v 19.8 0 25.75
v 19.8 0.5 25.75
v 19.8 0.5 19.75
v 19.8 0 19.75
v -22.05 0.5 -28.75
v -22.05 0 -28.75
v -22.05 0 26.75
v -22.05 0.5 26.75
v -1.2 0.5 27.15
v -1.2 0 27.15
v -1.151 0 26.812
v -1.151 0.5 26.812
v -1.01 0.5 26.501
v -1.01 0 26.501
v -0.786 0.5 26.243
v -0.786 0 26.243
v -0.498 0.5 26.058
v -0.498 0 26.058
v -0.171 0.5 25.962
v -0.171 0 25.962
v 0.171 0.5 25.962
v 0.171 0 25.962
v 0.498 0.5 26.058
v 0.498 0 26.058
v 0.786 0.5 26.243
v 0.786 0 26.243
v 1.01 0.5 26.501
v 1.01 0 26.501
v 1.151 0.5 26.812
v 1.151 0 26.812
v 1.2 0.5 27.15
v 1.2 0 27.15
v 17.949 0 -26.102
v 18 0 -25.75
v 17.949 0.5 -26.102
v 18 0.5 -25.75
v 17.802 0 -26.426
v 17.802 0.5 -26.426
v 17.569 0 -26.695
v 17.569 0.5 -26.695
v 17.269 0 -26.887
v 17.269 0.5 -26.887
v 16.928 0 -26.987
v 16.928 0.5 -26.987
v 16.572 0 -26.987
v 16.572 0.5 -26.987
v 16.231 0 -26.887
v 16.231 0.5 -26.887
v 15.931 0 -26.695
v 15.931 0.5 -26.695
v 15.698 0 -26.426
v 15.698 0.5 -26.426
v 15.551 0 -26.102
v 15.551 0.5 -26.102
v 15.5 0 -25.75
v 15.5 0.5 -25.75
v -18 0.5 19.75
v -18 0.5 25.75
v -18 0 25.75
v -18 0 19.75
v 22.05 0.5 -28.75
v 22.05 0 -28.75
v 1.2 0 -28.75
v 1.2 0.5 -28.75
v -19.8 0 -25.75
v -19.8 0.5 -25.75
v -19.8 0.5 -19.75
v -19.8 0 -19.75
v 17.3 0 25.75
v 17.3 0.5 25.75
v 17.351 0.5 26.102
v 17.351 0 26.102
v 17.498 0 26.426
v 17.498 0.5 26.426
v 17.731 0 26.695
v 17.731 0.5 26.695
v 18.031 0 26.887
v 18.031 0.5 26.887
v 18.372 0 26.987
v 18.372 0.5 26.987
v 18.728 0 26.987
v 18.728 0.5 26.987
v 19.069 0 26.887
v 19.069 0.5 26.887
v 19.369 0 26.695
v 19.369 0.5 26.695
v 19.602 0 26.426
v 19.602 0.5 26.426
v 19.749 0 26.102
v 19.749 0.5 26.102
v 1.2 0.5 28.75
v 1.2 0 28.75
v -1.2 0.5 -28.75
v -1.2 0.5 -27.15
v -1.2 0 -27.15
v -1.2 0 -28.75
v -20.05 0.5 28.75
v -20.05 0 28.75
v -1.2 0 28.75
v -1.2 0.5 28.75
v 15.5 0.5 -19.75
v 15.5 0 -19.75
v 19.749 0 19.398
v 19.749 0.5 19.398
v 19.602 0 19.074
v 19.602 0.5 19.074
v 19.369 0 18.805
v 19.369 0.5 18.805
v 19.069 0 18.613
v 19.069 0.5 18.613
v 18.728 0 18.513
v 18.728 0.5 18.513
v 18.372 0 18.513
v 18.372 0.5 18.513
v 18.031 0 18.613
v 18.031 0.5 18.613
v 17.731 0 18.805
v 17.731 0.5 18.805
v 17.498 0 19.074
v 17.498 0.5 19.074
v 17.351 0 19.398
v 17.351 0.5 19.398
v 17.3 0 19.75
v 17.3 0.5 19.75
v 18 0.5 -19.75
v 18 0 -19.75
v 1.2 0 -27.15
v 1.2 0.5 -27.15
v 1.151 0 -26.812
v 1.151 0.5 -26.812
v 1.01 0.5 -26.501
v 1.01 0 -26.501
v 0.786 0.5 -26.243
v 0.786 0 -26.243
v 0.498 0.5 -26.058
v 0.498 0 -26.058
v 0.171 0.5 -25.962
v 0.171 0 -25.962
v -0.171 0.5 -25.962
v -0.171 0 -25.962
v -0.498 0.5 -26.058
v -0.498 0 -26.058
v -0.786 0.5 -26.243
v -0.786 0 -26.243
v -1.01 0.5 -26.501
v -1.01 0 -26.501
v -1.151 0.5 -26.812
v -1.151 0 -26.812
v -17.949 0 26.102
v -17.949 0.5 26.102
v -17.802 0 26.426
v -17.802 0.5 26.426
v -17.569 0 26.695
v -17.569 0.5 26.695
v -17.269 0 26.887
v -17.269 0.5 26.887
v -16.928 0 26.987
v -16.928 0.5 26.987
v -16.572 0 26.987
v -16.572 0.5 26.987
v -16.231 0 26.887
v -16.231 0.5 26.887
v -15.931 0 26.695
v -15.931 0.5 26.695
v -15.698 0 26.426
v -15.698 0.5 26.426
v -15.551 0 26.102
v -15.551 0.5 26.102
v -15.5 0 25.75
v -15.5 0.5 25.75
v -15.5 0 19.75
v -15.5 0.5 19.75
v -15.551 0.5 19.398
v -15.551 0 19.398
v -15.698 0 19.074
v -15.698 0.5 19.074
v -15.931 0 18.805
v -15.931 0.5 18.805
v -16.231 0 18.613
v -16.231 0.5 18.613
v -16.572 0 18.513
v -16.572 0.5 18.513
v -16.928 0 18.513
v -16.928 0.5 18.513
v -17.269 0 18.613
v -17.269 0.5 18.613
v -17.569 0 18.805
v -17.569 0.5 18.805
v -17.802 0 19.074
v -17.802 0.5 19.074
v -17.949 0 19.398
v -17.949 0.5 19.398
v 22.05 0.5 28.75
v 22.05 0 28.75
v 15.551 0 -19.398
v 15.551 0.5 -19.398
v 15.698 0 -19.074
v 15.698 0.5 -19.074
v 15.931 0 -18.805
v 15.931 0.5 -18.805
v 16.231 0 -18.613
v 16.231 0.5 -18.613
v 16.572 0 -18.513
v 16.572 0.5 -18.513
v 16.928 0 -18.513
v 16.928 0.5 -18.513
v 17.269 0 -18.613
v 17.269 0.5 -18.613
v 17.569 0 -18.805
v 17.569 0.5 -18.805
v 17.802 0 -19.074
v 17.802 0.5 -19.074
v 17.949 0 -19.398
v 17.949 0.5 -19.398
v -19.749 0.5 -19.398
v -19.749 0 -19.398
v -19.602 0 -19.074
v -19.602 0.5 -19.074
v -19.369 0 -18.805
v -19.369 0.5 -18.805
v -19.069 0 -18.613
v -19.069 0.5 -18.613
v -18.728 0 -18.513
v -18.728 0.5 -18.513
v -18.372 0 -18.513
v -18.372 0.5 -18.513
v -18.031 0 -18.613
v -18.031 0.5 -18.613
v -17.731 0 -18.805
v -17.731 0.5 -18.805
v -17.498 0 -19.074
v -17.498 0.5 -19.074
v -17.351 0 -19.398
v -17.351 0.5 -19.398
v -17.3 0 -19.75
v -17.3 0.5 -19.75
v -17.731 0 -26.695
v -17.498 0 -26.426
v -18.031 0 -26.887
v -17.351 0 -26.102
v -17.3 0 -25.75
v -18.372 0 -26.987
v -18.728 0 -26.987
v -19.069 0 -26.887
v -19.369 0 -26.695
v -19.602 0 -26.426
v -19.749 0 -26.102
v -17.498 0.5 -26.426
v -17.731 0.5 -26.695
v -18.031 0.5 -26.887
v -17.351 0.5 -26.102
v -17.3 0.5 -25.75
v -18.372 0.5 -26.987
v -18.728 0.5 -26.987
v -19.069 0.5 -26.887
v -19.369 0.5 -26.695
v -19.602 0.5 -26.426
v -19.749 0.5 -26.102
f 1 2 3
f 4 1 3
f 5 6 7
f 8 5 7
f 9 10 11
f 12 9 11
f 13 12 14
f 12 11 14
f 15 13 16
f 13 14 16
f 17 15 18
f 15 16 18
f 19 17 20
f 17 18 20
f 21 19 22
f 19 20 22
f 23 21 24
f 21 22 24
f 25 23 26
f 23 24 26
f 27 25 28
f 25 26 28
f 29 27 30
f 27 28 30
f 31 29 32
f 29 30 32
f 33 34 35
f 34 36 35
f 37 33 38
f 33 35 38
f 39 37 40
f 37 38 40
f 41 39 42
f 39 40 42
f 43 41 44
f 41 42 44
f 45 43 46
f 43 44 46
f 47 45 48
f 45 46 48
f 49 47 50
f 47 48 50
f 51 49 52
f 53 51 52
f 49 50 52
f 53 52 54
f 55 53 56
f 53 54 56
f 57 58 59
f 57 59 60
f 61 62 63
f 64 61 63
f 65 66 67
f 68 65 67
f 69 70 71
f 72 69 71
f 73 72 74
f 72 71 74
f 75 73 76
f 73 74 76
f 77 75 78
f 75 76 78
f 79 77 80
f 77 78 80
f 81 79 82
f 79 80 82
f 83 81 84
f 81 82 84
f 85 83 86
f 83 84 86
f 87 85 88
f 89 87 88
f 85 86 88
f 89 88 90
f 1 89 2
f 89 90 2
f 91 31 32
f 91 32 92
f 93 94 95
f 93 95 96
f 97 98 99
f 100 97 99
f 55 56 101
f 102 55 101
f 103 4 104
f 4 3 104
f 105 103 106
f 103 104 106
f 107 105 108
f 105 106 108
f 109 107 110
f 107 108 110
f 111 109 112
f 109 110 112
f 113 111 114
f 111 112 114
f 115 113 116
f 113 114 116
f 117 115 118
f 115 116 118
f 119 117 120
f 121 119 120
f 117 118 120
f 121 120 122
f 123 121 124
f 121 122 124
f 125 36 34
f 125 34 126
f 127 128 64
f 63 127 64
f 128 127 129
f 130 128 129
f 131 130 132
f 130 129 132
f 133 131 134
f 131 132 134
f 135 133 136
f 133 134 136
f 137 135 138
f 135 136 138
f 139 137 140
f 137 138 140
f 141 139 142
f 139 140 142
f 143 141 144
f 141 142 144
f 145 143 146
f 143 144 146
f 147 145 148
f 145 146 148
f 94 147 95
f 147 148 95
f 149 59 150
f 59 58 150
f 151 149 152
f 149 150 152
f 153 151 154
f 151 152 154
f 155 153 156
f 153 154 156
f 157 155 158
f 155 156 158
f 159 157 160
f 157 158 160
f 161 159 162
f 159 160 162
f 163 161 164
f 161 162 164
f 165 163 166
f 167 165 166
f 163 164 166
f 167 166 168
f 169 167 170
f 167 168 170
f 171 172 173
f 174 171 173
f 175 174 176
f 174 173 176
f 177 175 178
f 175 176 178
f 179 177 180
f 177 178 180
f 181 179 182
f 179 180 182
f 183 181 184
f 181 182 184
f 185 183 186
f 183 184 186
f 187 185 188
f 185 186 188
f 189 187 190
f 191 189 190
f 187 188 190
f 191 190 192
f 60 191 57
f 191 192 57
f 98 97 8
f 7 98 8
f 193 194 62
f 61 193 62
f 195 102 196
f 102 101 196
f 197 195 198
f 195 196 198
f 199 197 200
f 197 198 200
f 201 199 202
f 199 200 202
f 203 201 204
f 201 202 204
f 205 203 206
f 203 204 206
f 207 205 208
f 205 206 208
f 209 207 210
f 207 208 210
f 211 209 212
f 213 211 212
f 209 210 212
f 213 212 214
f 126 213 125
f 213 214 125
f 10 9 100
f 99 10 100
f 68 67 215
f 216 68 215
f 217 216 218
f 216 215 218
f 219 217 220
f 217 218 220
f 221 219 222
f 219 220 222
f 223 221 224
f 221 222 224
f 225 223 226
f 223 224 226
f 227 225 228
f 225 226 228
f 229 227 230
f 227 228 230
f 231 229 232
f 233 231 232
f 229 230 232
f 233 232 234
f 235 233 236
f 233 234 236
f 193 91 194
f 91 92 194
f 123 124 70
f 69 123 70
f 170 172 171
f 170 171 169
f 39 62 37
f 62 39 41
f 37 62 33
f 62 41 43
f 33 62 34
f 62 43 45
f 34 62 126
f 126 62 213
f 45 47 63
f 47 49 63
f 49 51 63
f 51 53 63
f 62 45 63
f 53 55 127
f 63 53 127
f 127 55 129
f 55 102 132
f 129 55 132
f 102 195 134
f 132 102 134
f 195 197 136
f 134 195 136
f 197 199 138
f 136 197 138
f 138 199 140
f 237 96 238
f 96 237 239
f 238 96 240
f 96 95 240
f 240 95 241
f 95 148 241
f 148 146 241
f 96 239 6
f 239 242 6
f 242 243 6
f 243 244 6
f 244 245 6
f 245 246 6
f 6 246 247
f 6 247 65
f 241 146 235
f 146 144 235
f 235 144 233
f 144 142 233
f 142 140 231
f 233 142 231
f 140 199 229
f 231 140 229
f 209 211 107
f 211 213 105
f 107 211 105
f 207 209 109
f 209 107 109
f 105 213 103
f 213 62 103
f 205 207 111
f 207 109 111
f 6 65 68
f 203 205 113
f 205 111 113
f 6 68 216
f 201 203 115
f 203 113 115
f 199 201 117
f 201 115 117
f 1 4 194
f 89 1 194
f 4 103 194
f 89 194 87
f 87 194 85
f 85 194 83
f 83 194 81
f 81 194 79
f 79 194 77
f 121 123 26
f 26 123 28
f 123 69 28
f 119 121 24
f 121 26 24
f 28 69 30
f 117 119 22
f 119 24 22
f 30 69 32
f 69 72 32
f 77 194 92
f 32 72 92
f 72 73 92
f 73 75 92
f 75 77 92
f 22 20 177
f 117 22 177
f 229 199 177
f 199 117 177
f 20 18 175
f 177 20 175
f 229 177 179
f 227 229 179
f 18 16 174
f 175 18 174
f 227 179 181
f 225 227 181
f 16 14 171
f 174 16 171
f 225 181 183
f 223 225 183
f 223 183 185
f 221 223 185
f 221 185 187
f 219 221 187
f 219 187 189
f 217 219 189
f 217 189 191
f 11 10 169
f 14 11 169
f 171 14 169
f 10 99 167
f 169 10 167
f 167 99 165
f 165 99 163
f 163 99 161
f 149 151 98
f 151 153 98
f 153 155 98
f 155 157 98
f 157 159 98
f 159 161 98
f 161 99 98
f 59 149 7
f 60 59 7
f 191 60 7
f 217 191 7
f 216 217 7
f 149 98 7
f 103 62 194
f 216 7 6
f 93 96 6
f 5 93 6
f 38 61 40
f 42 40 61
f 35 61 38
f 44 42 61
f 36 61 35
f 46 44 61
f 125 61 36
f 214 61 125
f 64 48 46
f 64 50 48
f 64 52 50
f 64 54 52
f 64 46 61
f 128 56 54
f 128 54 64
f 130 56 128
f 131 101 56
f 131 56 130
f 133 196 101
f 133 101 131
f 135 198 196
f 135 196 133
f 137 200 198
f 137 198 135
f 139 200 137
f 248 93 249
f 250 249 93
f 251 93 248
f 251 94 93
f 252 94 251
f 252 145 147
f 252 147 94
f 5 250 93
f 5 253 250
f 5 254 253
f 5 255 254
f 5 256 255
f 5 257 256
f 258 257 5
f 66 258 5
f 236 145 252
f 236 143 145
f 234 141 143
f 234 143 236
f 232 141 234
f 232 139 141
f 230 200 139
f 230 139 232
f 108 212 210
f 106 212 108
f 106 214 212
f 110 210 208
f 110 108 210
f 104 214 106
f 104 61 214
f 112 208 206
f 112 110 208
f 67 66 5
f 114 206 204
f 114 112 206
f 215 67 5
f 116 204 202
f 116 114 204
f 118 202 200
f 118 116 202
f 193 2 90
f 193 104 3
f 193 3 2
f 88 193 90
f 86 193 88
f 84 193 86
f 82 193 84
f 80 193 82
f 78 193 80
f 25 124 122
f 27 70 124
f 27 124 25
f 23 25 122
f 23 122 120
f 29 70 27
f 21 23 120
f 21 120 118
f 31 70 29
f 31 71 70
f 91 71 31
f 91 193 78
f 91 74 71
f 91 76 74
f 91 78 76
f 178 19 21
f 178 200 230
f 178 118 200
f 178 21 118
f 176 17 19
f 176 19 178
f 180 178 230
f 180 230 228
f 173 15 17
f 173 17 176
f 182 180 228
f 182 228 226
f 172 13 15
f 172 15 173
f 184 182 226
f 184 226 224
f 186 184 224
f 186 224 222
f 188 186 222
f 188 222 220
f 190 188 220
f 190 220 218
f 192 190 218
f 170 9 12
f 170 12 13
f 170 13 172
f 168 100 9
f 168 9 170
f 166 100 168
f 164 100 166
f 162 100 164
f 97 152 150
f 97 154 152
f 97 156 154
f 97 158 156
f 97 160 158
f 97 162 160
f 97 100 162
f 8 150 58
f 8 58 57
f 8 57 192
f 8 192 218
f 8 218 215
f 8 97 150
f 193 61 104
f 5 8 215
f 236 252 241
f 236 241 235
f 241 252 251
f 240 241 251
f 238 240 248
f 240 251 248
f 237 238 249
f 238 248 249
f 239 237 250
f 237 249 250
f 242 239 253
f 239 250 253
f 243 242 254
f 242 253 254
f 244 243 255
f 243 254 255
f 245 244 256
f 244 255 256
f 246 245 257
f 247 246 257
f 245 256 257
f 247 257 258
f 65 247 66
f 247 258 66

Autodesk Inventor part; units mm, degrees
ref_plane "YZ Plane" through (0, 0, 0) normal (1, 0, 0) x (0, 1, 0)
ref_plane "XZ Plane" through (0, 0, 0) normal (0, 1, 0) x (-1, 0, 0)
ref_plane "XY Plane" through (0, 0, 0) normal (0, 0, 1) x (1, 0, 0)
sketch "Sketch2" plane through (0, 0, 0) normal (0, 1, 0) x (-1, 0, 0)
  line L0 (-22.05, -28.75) -> (22.05, -28.75)
  line L1 (22.05, -28.75) -> (22.05, 28.75)
  line L2 (22.05, 28.75) -> (-22.05, 28.75)
  line L3 (-22.05, 28.75) -> (-22.05, -28.75)
  line L4 (-22.05, -28.75) -> (22.05, 28.75) construction
  line L5 (22.05, -28.75) -> (-22.05, 28.75) construction
  point P0 (0, 0)
  dimension "d28" = 44.1
  dimension "d29" = 57.5
extrude "Extrusion2" add sketch "Sketch2" along normal blind 0.5
sketch "Sketch3" plane through (0, 0.5, 0) normal (0, 1, 0) x (1, 0, 0)
  line L0 (3.17, 0) -> (-3.4256, 0) construction
  line L1 (-18, -28.75) -> (-18, -19.75)
  line L2 (-15.5, -19.75) -> (-15.5, -28.75)
  arc A0 (-15.5, -19.75) -> (-18, -19.75) centre (-16.75, -19.75) ccw
  line L3 (-22.05, -28.75) -> (22.05, -28.75) projected
  line L4 (-22.05, 28.75) -> (-22.05, -28.75) projected
  line L5 (19.8, -28.75) -> (19.8, -19.75)
  line L6 (17.3, -19.75) -> (17.3, -28.75)
  arc A1 (19.8, -19.75) -> (17.3, -19.75) centre (18.55, -19.75) ccw
  line L7 (15.5, 28.75) -> (15.5, 19.75)
  line L8 (22.05, 28.75) -> (-22.05, 28.75) projected
  line L9 (18, 28.75) -> (18, 19.75)
  arc A2 (15.5, 19.75) -> (18, 19.75) centre (16.75, 19.75) ccw
  line L10 (22.05, -28.75) -> (22.05, 28.75) projected
  line L11 (-19.8, 28.75) -> (-19.8, 19.75)
  line L12 (-17.3, 28.75) -> (-17.3, 19.75)
  arc A3 (-19.8, 19.75) -> (-17.3, 19.75) centre (-18.55, 19.75) ccw
  point P0 (0, 0)
  point P1 (10.634, -28.75)
  point P2 (12.3949, -28.75)
  dimension "d32" = 2.5
  dimension "d33" = 9
  dimension "d34" = 1.25
  dimension "d48" = 5.3
  dimension "d60" = 9
  dimension "d61" = 9
  dimension "d62" = 1.25
  dimension "d64" = 9
  dimension "d65" = 9
  dimension "d66" = 1.25
  dimension "d71" = 3.5
  dimension "d87" = 5.3
  dimension "d88" = 3.5
extrude "Extrusion3" cut sketch "Sketch3" against normal through all contours L1 A0 L2 L3 | L6 A1 L5 L3 | L8 L12 A3 L11 | L8 L9 A2 L7
sketch "Sketch4" plane through (0, 0.5, 0) normal (0, 1, 0) x (1, 0, 0)
  line L0 (-22.05, 28.75) -> (-22.05, -28.75) projected
  line L1 (-22.05, -28.75) -> (22.05, -28.75) projected
  line L2 (22.05, -28.75) -> (22.05, 28.75) projected
  line L3 (22.05, 28.75) -> (-22.05, 28.75) projected
  point P0 (0, 0)
  point P1 (0, -27.15)
  point P2 (0, 27.15)
  point P3 (-18, -28.75)
  point P4 (-12.775, 28.75)
  dimension "d37" = 22.05
  dimension "d38" = 1.6
  dimension "d40" = 1.6
  dimension "d68" = 44.1
hole "Hole1" at (0, 0.5, 27.15) at (0, 0.5, -27.15) direction (0, -1, 0) diameter 2.4 end through all clearance for "Flat Head Machine Screw" size "M2" standard "Ansi Metric M Profile"
sketch "Sketch5" plane through (0, 0.5, 0) normal (0, 1, 0) x (1, 0, 0)
  line L0 (-22.05, -28.75) -> (-18, -28.75) projected
  line L1 (-20.05, -28.75) -> (-22.05, -26.75)
  line L2 (-22.05, 28.75) -> (-22.05, -28.75) projected
  point P0 (0, 0)
  dimension "d49" = 2
  dimension "d50" = 2
extrude "Extrusion4" cut sketch "Sketch5" against normal through all
sketch "Sketch6" plane through (0, 0.5, 0) normal (0, 1, 0) x (1, 0, 0)
  circle A0 centre (0, -27.15) radius 1.2 projected
  line L0 (-1.2, -27.15) -> (-1.2, -28.75)
  line L1 (-15.5, -28.75) -> (17.3, -28.75) projected
  line L2 (1.2, -27.15) -> (1.2, -28.75)
  line L3 (1.2, -27.15) -> (-1.2, -27.15)
  line L4 (24.0299, 0) -> (-42.1887, 0)
  line L5 (-1.2, 27.15) -> (-1.2, 28.75)
  line L6 (1.2, 27.15) -> (1.2, 28.75)
  line L7 (1.2, 27.15) -> (-1.2, 27.15)
  line L8 (15.5, 28.75) -> (-17.3, 28.75) projected
  point P0 (0, 0)
  point P1 (0, 27.15)
extrude "Extrusion5" cut sketch "Sketch6" against normal through all contours L2 L1 L0 A0 | L5 L8 L6 L7
sketch "Sketch7" plane through (0, 0.5, 0) normal (0, 1, 0) x (1, 0, 0)
  line L0 (-15.5, -19.75) -> (-15.5, -28.75) projected
  arc A0 (-18, -25.75) -> (-15.5, -25.75) centre (-16.75, -25.75) ccw
  line L1 (-18, -28.75) -> (-18, -19.75) projected
  arc A1 (-15.5, -19.75) -> (-18, -19.75) centre (-16.75, -19.75) ccw projected
  line L2 (-15.5, -28.75) -> (-1.2, -28.75) projected
  line L3 (-18, -28.75) -> (-15.5, -28.75)
  arc A2 (17.3, -25.75) -> (19.8, -25.75) centre (18.55, -25.75) ccw
  line L4 (17.3, -28.75) -> (17.3, -19.75) projected
  line L5 (19.8, -19.75) -> (19.8, -28.75) projected
  line L6 (1.2, -28.75) -> (17.3, -28.75) projected
  line L7 (17.3, -28.75) -> (19.8, -28.75)
  line L8 (-17.3, 28.75) -> (-17.3, 19.75) projected
  line L9 (-19.8, 19.75) -> (-19.8, 28.75) projected
  arc A3 (-17.3, 25.75) -> (-19.8, 25.75) centre (-18.55, 25.75) ccw
  line L10 (-1.2, 28.75) -> (-17.3, 28.75) projected
  line L11 (15.5, 28.75) -> (1.2, 28.75) projected
  arc A4 (18, 25.75) -> (15.5, 25.75) centre (16.75, 25.75) ccw
  line L12 (15.5, 19.75) -> (15.5, 28.75) projected
  line L13 (18, 28.75) -> (18, 19.75) projected
  line L14 (-19.8, 28.75) -> (-17.3, 28.75)
  line L15 (15.5, 28.75) -> (18, 28.75)
  point P0 (0, 0)
  dimension "d73" = 1.25
  dimension "d74" = 1.25
  dimension "d75" = 3
  dimension "d78" = 1.25
  dimension "d80" = 3
  dimension "d81" = 1.25
  dimension "d82" = 3
  dimension "d85" = 1.25
  dimension "d86" = 3
extrude "Extrusion6" add sketch "Sketch7" against normal up to surface (0.5 mm away) contours L0 L3 L1 A0 | A2 L5 L7 L4 | L8 A3 L9 L14 | A4 L12 L15 L13
equation "\"d34\" = 0.5 * d32"
equation "\"d60\" = d33"
equation "\"d61\" = d33"
equation "\"d62\" = d34"
equation "\"d64\" = d33"
equation "\"d65\" = d33"
equation "\"d66\" = d34"
equation "\"d87\" = d48"
equation "\"d88\" = d71"
equation "\"d37\" = 0.5 * d68"
equation "\"d40\" = d38"
equation "\"d73\" = d74"
equation "\"d78\" = d79"
equation "\"d80\" = d75"
equation "\"d81\" = d74"
equation "\"d82\" = d75"
equation "\"d85\" = d74"
equation "\"d86\" = d75"
equation "\"d79\" = 1.25"
properties part number "etl standard baseplate with cutouts"
